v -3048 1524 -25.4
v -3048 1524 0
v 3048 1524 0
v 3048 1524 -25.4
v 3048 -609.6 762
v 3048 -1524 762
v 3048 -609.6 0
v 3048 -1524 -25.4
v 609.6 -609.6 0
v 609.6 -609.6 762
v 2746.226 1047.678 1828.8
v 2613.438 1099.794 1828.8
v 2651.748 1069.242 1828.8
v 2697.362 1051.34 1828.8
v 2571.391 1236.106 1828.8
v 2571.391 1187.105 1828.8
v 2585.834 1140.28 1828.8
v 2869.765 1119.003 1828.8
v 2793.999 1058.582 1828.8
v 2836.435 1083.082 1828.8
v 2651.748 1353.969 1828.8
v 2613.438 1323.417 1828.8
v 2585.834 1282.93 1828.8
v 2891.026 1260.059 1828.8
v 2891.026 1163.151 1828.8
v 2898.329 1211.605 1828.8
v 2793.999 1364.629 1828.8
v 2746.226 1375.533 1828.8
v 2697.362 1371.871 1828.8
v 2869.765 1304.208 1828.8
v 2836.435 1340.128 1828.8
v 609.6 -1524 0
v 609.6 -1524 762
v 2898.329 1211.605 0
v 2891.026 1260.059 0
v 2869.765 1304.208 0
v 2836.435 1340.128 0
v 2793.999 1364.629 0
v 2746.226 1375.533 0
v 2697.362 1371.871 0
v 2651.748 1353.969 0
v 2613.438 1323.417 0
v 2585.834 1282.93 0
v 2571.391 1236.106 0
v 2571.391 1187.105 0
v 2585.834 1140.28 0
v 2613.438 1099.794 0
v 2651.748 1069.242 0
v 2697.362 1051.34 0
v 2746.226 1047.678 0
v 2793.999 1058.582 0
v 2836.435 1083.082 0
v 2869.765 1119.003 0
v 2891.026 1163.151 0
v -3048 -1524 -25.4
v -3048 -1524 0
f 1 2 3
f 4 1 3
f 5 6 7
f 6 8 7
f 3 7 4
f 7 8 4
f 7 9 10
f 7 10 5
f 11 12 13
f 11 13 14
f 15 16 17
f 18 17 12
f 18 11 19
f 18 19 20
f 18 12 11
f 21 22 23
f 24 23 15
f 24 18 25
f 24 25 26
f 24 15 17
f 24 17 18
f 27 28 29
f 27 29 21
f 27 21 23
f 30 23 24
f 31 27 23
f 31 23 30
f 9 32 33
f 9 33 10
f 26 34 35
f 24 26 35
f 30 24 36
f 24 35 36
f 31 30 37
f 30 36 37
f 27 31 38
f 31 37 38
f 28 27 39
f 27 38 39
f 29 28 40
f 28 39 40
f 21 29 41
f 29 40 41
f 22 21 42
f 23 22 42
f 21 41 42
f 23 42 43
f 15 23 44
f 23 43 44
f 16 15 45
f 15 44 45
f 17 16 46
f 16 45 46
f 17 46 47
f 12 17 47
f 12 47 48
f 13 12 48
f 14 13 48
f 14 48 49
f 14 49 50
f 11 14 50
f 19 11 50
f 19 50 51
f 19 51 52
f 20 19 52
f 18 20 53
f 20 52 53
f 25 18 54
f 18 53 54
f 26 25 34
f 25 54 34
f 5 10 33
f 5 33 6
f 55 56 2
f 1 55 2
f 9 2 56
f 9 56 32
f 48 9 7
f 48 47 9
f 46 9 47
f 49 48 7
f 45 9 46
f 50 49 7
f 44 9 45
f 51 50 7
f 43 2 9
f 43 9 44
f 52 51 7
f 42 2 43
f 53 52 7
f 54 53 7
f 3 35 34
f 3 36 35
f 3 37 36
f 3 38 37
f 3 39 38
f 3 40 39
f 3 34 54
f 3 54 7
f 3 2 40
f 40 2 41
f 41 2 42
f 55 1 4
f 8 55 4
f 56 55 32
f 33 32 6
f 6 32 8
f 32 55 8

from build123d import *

# Parameters (mm, degrees)
F0_W     = 6096
F0_H     = 3048
F1_DEPTH = 25.4
F2_W     = 2438.4
F2_H     = 914.4
F3_DEPTH = 762
F4_R     = 164.38696
F5_DEPTH = 1828.8


with BuildPart() as f1:
    # F0 (on Top) → F1 (new body)
    with BuildSketch(Plane.XY):
        Rectangle(F0_W, F0_H)
    extrude(amount=-F1_DEPTH)

    # F2 (on face) → F3 (join)
    with BuildSketch(Plane.XY):
        with Locations((1828.8, -1066.8)):
            Rectangle(F2_W, F2_H)
    extrude(amount=F3_DEPTH)

    # F4 (on face) → F5 (join)
    with BuildSketch(Plane.XY):
        with Locations((2733.941793, 1211.60531)):
            Circle(F4_R)
    extrude(amount=F5_DEPTH)


solid = f1.part
